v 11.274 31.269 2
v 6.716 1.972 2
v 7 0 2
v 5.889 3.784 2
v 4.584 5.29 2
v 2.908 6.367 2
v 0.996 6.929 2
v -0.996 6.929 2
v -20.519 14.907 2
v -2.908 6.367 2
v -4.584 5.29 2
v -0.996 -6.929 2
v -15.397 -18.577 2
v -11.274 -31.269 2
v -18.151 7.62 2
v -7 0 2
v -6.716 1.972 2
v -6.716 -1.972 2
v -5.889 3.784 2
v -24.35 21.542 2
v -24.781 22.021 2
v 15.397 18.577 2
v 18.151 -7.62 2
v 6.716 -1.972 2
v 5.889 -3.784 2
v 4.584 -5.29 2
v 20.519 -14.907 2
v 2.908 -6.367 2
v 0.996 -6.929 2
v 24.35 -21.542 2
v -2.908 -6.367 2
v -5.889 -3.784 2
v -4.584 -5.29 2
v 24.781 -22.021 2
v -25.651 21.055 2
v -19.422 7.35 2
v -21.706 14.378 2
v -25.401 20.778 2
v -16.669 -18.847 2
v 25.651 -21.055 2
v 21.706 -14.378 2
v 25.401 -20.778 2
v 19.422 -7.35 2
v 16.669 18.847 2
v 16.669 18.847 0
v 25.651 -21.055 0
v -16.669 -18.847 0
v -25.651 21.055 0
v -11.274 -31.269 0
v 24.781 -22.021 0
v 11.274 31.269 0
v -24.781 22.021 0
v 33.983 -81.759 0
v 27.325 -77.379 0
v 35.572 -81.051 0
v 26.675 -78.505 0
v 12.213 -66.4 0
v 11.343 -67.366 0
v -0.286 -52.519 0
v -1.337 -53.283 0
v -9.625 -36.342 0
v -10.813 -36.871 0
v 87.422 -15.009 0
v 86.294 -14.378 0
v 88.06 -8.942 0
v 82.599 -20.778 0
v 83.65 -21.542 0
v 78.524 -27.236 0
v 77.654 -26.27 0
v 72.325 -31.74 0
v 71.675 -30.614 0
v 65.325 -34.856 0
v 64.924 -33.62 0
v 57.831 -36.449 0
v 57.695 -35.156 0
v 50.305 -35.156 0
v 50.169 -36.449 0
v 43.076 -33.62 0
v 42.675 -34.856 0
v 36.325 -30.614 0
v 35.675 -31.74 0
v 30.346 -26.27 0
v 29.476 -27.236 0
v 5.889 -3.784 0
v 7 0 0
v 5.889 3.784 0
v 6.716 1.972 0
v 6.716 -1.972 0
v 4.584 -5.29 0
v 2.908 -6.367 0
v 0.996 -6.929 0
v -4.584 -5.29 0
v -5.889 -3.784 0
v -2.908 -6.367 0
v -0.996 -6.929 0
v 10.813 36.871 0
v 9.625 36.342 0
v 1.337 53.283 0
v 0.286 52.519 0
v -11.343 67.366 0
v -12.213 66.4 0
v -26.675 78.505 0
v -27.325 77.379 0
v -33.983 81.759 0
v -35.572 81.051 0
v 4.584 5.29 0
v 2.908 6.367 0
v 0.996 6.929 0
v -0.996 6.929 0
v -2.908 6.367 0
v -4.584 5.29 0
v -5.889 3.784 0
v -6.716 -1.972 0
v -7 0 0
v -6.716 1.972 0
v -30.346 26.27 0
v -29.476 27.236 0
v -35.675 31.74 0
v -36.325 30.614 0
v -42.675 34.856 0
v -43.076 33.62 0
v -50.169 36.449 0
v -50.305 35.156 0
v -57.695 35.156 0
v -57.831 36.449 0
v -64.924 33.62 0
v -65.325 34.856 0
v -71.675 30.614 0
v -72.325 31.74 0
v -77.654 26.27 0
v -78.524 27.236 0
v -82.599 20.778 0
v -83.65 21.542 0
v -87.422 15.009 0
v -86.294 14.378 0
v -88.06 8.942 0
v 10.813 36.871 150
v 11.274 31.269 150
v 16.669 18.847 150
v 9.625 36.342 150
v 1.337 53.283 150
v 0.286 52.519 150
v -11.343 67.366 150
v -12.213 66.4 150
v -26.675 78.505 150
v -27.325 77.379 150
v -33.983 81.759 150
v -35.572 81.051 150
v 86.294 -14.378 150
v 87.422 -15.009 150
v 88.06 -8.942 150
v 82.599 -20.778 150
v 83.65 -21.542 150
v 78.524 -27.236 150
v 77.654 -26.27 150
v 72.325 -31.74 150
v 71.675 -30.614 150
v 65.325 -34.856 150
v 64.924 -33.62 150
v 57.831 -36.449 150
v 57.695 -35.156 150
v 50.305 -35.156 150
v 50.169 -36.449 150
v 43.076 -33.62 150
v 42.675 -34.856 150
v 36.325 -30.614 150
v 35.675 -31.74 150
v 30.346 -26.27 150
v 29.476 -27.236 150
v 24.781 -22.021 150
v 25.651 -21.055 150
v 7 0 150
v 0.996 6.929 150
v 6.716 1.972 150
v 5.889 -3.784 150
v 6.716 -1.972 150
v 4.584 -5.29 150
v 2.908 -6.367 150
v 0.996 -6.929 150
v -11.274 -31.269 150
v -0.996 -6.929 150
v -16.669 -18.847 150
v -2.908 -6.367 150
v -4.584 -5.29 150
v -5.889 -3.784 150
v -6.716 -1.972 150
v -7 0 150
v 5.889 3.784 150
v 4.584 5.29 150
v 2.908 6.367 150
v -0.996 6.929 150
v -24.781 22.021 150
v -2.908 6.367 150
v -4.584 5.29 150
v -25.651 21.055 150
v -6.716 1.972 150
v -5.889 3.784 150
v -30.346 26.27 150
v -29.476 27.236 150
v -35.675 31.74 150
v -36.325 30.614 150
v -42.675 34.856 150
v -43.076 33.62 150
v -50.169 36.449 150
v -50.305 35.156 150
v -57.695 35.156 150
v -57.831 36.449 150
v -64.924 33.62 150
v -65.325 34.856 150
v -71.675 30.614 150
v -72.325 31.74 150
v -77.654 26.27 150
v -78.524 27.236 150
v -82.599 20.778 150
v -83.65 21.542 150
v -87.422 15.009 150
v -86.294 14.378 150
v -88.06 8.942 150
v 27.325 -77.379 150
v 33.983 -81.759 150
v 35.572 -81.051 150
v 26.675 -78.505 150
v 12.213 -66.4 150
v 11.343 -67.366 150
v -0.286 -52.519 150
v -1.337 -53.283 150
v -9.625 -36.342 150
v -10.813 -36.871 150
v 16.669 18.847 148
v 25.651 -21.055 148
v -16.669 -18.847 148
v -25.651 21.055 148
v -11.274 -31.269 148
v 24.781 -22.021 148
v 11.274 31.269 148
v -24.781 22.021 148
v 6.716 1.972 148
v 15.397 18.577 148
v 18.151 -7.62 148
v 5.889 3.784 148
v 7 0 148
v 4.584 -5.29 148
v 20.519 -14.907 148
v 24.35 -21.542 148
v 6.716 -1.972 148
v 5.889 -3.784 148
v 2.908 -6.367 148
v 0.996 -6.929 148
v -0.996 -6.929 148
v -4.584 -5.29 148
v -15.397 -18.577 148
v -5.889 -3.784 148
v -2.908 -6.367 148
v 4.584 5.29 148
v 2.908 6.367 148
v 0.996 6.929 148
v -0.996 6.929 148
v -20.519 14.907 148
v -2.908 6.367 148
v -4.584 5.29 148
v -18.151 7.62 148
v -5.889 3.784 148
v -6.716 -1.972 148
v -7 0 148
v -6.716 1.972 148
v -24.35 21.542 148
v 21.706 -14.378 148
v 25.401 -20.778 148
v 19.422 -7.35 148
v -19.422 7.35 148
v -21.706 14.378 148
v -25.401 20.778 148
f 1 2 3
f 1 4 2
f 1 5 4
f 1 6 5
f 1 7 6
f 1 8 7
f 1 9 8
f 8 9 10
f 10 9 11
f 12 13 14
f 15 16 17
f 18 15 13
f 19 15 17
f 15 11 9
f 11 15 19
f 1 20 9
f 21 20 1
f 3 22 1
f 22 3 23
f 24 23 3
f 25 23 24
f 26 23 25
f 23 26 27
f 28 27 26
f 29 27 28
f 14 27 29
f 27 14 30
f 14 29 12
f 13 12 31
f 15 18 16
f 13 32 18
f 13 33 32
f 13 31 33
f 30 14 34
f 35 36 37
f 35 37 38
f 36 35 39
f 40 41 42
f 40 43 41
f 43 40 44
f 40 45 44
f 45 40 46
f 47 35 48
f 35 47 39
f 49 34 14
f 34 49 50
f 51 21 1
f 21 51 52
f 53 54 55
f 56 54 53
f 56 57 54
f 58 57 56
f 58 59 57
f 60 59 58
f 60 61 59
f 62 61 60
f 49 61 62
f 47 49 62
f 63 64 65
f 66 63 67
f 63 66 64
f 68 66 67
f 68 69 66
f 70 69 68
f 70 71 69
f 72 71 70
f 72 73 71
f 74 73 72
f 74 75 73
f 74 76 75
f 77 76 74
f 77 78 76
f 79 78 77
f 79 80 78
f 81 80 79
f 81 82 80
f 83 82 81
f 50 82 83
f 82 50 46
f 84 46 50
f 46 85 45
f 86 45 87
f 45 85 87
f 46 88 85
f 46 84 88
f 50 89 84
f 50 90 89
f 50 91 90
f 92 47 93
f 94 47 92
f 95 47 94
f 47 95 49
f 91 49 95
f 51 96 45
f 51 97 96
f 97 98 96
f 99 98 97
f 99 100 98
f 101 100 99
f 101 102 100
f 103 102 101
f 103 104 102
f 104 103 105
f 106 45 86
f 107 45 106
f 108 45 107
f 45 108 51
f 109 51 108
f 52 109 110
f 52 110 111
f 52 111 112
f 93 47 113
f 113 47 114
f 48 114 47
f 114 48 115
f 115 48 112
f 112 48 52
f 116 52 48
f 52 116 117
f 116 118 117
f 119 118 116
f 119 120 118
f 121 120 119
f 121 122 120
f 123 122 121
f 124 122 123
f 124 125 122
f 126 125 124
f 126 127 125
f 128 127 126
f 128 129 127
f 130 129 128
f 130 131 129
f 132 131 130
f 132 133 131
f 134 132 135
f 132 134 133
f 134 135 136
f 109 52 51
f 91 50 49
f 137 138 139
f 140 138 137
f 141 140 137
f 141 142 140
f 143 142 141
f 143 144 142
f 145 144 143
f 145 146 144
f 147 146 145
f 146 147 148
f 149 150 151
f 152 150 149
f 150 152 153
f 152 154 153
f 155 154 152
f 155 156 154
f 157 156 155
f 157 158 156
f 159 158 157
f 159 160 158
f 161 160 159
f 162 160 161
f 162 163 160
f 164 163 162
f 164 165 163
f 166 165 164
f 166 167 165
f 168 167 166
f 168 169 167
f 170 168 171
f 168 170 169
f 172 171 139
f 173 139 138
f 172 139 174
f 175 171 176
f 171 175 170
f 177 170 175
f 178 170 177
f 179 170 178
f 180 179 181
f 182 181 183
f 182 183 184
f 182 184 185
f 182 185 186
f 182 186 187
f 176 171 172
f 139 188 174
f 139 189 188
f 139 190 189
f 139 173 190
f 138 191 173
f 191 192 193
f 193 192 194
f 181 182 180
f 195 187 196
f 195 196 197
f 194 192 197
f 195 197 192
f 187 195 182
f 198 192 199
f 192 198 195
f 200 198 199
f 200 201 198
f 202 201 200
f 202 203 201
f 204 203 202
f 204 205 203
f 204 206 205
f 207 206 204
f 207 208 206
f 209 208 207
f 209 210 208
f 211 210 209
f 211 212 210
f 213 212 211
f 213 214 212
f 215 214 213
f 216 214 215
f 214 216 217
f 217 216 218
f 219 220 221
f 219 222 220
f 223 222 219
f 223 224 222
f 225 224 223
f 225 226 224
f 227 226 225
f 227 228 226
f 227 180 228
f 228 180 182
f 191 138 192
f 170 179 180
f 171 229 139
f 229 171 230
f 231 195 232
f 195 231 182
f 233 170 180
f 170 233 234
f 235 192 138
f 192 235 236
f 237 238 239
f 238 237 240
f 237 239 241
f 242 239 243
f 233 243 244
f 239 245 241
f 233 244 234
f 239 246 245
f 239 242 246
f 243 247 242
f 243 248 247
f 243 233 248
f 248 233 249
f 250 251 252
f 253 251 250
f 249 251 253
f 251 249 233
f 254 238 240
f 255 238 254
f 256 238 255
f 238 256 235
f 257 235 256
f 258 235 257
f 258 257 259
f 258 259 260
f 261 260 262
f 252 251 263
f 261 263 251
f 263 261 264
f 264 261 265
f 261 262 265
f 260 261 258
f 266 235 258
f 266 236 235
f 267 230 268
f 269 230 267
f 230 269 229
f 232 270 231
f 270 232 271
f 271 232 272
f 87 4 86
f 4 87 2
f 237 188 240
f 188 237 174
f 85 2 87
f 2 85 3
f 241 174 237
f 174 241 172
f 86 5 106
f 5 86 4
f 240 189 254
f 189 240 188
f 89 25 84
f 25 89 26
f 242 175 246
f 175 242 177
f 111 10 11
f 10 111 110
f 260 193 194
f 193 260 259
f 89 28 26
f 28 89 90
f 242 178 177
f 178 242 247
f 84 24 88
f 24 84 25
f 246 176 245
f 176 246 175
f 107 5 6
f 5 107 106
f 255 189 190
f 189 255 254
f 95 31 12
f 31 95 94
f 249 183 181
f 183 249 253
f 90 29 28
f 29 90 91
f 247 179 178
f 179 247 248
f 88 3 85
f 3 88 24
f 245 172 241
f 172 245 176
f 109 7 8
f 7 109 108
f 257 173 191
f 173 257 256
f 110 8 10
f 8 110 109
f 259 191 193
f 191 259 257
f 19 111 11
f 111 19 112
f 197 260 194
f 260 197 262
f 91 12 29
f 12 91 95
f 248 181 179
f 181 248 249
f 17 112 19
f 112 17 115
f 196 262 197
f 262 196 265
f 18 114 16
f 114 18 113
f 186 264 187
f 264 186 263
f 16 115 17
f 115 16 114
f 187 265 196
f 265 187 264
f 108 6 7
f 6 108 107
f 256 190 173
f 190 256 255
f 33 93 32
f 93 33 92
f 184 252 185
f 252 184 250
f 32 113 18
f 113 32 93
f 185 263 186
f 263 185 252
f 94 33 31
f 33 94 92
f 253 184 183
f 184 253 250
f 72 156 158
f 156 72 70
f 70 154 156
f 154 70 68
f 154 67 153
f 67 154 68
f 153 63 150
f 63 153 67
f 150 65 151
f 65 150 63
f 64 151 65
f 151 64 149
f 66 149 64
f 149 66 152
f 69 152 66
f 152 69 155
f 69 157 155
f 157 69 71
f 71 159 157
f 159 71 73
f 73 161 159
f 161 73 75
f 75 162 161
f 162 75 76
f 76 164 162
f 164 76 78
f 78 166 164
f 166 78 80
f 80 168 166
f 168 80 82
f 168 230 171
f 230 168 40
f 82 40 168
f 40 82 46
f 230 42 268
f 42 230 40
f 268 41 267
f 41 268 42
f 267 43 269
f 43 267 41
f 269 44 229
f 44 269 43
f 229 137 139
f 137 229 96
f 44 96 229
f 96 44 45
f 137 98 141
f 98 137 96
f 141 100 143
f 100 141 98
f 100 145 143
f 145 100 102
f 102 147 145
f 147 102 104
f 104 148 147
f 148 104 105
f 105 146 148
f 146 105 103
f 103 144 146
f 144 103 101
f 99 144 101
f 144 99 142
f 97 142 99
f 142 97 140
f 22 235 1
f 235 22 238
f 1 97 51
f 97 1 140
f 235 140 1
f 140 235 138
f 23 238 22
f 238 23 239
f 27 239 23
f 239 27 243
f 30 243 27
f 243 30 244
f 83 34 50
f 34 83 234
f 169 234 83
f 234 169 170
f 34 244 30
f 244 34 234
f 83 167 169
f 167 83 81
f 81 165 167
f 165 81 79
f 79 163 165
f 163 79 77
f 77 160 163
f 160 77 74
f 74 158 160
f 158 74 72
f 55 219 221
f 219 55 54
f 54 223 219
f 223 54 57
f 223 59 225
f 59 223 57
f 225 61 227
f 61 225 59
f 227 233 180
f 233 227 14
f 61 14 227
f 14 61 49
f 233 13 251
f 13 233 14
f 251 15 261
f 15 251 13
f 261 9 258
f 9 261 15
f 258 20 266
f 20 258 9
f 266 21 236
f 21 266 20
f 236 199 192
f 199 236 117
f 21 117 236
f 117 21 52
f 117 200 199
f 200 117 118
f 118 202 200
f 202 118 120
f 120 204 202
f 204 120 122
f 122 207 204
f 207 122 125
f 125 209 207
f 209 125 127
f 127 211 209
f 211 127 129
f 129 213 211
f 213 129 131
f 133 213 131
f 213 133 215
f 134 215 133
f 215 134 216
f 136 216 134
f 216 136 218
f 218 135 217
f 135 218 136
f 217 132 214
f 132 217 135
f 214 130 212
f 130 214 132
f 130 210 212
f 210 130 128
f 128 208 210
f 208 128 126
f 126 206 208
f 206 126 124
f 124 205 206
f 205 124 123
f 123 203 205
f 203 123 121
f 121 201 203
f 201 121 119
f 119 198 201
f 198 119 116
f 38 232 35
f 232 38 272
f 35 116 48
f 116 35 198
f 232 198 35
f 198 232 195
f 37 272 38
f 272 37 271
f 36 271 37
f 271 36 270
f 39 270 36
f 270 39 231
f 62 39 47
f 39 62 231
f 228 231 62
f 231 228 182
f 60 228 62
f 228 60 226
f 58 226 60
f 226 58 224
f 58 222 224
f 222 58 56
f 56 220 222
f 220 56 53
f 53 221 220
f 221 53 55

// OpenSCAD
wall_thickness = 1.3;
Radius = 90;
height = 150;
Hole_diameter = 14;

module half_cricle(rad) {
  difference() {
    difference() {
      circle(r=(rad + wall_thickness / 2));

      circle(r=(rad - wall_thickness / 2));
    }

    translate([0, 500, 0]){
      square([1000, 1000], center=true);
    }
  }
}

module Circle(rad, cutter) {
  difference() {
    circle(r=(rad + cutter / 1));

    circle(r=(rad - 0));
  }
}



difference() {
  union(){
    hull(){
      cylinder(r1=5, r2=5, h=2, center=false);
      intersection() {
        intersection() {
          linear_extrude( height=height, twist=0, scale=[1, 1], center=false){
            difference() {
              union(){
                union(){
                  translate([(0.6 * Radius), 0, 0]){
                    half_cricle(0.4 * Radius);
                  }
                  translate([(0.8 * Radius), 0, 0]){
                    half_cricle(1 * Radius);
                  }
                }
                mirror([0,1,0]){
                  mirror([1,0,0]){
                    union(){
                      translate([(0.6 * Radius), 0, 0]){
                        half_cricle(0.4 * Radius);
                      }
                      translate([(0.8 * Radius), 0, 0]){
                        half_cricle(1 * Radius);
                      }
                    }
                  }
                }
              }

              Circle(Radius - 1, 1000);
            }
          }

          linear_extrude( height=2, twist=0, scale=[1, 1], center=false){
            difference() {
              circle(r=(Radius / 2.7));

              circle(r=2.5);
            }
          }

        }

        linear_extrude( height=2, twist=0, scale=[1, 1], center=false){
          difference() {
            circle(r=(Radius / 2.7));

            circle(r=2.5);
          }
        }

      }
    }
    translate([0, 0, (height - 2)]){
      hull(){
        cylinder(r1=5, r2=5, h=2, center=false);
        intersection() {
          intersection() {
            linear_extrude( height=height, twist=0, scale=[1, 1], center=false){
              difference() {
                union(){
                  union(){
                    translate([(0.6 * Radius), 0, 0]){
                      half_cricle(0.4 * Radius);
                    }
                    translate([(0.8 * Radius), 0, 0]){
                      half_cricle(1 * Radius);
                    }
                  }
                  mirror([0,1,0]){
                    mirror([1,0,0]){
                      union(){
                        translate([(0.6 * Radius), 0, 0]){
                          half_cricle(0.4 * Radius);
                        }
                        translate([(0.8 * Radius), 0, 0]){
                          half_cricle(1 * Radius);
                        }
                      }
                    }
                  }
                }

                Circle(Radius - 1, 1000);
              }
            }

            linear_extrude( height=2, twist=0, scale=[1, 1], center=false){
              difference() {
                circle(r=(Radius / 2.7));

                circle(r=2.5);
              }
            }

          }

          linear_extrude( height=2, twist=0, scale=[1, 1], center=false){
            difference() {
              circle(r=(Radius / 2.7));

              circle(r=2.5);
            }
          }

        }
      }
    }
  }

  cylinder(r1=Hole_diameter/2, r2=Hole_diameter/2, h=10000, center=false);
}
linear_extrude( height=height, twist=0, scale=[1, 1], center=false){
  difference() {
    union(){
      union(){
        translate([(0.6 * Radius), 0, 0]){
          half_cricle(0.4 * Radius);
        }
        translate([(0.8 * Radius), 0, 0]){
          half_cricle(1 * Radius);
        }
      }
      mirror([0,1,0]){
        mirror([1,0,0]){
          union(){
            translate([(0.6 * Radius), 0, 0]){
              half_cricle(0.4 * Radius);
            }
            translate([(0.8 * Radius), 0, 0]){
              half_cricle(1 * Radius);
            }
          }
        }
      }
    }

    Circle(Radius - 1, 1000);
  }
}
